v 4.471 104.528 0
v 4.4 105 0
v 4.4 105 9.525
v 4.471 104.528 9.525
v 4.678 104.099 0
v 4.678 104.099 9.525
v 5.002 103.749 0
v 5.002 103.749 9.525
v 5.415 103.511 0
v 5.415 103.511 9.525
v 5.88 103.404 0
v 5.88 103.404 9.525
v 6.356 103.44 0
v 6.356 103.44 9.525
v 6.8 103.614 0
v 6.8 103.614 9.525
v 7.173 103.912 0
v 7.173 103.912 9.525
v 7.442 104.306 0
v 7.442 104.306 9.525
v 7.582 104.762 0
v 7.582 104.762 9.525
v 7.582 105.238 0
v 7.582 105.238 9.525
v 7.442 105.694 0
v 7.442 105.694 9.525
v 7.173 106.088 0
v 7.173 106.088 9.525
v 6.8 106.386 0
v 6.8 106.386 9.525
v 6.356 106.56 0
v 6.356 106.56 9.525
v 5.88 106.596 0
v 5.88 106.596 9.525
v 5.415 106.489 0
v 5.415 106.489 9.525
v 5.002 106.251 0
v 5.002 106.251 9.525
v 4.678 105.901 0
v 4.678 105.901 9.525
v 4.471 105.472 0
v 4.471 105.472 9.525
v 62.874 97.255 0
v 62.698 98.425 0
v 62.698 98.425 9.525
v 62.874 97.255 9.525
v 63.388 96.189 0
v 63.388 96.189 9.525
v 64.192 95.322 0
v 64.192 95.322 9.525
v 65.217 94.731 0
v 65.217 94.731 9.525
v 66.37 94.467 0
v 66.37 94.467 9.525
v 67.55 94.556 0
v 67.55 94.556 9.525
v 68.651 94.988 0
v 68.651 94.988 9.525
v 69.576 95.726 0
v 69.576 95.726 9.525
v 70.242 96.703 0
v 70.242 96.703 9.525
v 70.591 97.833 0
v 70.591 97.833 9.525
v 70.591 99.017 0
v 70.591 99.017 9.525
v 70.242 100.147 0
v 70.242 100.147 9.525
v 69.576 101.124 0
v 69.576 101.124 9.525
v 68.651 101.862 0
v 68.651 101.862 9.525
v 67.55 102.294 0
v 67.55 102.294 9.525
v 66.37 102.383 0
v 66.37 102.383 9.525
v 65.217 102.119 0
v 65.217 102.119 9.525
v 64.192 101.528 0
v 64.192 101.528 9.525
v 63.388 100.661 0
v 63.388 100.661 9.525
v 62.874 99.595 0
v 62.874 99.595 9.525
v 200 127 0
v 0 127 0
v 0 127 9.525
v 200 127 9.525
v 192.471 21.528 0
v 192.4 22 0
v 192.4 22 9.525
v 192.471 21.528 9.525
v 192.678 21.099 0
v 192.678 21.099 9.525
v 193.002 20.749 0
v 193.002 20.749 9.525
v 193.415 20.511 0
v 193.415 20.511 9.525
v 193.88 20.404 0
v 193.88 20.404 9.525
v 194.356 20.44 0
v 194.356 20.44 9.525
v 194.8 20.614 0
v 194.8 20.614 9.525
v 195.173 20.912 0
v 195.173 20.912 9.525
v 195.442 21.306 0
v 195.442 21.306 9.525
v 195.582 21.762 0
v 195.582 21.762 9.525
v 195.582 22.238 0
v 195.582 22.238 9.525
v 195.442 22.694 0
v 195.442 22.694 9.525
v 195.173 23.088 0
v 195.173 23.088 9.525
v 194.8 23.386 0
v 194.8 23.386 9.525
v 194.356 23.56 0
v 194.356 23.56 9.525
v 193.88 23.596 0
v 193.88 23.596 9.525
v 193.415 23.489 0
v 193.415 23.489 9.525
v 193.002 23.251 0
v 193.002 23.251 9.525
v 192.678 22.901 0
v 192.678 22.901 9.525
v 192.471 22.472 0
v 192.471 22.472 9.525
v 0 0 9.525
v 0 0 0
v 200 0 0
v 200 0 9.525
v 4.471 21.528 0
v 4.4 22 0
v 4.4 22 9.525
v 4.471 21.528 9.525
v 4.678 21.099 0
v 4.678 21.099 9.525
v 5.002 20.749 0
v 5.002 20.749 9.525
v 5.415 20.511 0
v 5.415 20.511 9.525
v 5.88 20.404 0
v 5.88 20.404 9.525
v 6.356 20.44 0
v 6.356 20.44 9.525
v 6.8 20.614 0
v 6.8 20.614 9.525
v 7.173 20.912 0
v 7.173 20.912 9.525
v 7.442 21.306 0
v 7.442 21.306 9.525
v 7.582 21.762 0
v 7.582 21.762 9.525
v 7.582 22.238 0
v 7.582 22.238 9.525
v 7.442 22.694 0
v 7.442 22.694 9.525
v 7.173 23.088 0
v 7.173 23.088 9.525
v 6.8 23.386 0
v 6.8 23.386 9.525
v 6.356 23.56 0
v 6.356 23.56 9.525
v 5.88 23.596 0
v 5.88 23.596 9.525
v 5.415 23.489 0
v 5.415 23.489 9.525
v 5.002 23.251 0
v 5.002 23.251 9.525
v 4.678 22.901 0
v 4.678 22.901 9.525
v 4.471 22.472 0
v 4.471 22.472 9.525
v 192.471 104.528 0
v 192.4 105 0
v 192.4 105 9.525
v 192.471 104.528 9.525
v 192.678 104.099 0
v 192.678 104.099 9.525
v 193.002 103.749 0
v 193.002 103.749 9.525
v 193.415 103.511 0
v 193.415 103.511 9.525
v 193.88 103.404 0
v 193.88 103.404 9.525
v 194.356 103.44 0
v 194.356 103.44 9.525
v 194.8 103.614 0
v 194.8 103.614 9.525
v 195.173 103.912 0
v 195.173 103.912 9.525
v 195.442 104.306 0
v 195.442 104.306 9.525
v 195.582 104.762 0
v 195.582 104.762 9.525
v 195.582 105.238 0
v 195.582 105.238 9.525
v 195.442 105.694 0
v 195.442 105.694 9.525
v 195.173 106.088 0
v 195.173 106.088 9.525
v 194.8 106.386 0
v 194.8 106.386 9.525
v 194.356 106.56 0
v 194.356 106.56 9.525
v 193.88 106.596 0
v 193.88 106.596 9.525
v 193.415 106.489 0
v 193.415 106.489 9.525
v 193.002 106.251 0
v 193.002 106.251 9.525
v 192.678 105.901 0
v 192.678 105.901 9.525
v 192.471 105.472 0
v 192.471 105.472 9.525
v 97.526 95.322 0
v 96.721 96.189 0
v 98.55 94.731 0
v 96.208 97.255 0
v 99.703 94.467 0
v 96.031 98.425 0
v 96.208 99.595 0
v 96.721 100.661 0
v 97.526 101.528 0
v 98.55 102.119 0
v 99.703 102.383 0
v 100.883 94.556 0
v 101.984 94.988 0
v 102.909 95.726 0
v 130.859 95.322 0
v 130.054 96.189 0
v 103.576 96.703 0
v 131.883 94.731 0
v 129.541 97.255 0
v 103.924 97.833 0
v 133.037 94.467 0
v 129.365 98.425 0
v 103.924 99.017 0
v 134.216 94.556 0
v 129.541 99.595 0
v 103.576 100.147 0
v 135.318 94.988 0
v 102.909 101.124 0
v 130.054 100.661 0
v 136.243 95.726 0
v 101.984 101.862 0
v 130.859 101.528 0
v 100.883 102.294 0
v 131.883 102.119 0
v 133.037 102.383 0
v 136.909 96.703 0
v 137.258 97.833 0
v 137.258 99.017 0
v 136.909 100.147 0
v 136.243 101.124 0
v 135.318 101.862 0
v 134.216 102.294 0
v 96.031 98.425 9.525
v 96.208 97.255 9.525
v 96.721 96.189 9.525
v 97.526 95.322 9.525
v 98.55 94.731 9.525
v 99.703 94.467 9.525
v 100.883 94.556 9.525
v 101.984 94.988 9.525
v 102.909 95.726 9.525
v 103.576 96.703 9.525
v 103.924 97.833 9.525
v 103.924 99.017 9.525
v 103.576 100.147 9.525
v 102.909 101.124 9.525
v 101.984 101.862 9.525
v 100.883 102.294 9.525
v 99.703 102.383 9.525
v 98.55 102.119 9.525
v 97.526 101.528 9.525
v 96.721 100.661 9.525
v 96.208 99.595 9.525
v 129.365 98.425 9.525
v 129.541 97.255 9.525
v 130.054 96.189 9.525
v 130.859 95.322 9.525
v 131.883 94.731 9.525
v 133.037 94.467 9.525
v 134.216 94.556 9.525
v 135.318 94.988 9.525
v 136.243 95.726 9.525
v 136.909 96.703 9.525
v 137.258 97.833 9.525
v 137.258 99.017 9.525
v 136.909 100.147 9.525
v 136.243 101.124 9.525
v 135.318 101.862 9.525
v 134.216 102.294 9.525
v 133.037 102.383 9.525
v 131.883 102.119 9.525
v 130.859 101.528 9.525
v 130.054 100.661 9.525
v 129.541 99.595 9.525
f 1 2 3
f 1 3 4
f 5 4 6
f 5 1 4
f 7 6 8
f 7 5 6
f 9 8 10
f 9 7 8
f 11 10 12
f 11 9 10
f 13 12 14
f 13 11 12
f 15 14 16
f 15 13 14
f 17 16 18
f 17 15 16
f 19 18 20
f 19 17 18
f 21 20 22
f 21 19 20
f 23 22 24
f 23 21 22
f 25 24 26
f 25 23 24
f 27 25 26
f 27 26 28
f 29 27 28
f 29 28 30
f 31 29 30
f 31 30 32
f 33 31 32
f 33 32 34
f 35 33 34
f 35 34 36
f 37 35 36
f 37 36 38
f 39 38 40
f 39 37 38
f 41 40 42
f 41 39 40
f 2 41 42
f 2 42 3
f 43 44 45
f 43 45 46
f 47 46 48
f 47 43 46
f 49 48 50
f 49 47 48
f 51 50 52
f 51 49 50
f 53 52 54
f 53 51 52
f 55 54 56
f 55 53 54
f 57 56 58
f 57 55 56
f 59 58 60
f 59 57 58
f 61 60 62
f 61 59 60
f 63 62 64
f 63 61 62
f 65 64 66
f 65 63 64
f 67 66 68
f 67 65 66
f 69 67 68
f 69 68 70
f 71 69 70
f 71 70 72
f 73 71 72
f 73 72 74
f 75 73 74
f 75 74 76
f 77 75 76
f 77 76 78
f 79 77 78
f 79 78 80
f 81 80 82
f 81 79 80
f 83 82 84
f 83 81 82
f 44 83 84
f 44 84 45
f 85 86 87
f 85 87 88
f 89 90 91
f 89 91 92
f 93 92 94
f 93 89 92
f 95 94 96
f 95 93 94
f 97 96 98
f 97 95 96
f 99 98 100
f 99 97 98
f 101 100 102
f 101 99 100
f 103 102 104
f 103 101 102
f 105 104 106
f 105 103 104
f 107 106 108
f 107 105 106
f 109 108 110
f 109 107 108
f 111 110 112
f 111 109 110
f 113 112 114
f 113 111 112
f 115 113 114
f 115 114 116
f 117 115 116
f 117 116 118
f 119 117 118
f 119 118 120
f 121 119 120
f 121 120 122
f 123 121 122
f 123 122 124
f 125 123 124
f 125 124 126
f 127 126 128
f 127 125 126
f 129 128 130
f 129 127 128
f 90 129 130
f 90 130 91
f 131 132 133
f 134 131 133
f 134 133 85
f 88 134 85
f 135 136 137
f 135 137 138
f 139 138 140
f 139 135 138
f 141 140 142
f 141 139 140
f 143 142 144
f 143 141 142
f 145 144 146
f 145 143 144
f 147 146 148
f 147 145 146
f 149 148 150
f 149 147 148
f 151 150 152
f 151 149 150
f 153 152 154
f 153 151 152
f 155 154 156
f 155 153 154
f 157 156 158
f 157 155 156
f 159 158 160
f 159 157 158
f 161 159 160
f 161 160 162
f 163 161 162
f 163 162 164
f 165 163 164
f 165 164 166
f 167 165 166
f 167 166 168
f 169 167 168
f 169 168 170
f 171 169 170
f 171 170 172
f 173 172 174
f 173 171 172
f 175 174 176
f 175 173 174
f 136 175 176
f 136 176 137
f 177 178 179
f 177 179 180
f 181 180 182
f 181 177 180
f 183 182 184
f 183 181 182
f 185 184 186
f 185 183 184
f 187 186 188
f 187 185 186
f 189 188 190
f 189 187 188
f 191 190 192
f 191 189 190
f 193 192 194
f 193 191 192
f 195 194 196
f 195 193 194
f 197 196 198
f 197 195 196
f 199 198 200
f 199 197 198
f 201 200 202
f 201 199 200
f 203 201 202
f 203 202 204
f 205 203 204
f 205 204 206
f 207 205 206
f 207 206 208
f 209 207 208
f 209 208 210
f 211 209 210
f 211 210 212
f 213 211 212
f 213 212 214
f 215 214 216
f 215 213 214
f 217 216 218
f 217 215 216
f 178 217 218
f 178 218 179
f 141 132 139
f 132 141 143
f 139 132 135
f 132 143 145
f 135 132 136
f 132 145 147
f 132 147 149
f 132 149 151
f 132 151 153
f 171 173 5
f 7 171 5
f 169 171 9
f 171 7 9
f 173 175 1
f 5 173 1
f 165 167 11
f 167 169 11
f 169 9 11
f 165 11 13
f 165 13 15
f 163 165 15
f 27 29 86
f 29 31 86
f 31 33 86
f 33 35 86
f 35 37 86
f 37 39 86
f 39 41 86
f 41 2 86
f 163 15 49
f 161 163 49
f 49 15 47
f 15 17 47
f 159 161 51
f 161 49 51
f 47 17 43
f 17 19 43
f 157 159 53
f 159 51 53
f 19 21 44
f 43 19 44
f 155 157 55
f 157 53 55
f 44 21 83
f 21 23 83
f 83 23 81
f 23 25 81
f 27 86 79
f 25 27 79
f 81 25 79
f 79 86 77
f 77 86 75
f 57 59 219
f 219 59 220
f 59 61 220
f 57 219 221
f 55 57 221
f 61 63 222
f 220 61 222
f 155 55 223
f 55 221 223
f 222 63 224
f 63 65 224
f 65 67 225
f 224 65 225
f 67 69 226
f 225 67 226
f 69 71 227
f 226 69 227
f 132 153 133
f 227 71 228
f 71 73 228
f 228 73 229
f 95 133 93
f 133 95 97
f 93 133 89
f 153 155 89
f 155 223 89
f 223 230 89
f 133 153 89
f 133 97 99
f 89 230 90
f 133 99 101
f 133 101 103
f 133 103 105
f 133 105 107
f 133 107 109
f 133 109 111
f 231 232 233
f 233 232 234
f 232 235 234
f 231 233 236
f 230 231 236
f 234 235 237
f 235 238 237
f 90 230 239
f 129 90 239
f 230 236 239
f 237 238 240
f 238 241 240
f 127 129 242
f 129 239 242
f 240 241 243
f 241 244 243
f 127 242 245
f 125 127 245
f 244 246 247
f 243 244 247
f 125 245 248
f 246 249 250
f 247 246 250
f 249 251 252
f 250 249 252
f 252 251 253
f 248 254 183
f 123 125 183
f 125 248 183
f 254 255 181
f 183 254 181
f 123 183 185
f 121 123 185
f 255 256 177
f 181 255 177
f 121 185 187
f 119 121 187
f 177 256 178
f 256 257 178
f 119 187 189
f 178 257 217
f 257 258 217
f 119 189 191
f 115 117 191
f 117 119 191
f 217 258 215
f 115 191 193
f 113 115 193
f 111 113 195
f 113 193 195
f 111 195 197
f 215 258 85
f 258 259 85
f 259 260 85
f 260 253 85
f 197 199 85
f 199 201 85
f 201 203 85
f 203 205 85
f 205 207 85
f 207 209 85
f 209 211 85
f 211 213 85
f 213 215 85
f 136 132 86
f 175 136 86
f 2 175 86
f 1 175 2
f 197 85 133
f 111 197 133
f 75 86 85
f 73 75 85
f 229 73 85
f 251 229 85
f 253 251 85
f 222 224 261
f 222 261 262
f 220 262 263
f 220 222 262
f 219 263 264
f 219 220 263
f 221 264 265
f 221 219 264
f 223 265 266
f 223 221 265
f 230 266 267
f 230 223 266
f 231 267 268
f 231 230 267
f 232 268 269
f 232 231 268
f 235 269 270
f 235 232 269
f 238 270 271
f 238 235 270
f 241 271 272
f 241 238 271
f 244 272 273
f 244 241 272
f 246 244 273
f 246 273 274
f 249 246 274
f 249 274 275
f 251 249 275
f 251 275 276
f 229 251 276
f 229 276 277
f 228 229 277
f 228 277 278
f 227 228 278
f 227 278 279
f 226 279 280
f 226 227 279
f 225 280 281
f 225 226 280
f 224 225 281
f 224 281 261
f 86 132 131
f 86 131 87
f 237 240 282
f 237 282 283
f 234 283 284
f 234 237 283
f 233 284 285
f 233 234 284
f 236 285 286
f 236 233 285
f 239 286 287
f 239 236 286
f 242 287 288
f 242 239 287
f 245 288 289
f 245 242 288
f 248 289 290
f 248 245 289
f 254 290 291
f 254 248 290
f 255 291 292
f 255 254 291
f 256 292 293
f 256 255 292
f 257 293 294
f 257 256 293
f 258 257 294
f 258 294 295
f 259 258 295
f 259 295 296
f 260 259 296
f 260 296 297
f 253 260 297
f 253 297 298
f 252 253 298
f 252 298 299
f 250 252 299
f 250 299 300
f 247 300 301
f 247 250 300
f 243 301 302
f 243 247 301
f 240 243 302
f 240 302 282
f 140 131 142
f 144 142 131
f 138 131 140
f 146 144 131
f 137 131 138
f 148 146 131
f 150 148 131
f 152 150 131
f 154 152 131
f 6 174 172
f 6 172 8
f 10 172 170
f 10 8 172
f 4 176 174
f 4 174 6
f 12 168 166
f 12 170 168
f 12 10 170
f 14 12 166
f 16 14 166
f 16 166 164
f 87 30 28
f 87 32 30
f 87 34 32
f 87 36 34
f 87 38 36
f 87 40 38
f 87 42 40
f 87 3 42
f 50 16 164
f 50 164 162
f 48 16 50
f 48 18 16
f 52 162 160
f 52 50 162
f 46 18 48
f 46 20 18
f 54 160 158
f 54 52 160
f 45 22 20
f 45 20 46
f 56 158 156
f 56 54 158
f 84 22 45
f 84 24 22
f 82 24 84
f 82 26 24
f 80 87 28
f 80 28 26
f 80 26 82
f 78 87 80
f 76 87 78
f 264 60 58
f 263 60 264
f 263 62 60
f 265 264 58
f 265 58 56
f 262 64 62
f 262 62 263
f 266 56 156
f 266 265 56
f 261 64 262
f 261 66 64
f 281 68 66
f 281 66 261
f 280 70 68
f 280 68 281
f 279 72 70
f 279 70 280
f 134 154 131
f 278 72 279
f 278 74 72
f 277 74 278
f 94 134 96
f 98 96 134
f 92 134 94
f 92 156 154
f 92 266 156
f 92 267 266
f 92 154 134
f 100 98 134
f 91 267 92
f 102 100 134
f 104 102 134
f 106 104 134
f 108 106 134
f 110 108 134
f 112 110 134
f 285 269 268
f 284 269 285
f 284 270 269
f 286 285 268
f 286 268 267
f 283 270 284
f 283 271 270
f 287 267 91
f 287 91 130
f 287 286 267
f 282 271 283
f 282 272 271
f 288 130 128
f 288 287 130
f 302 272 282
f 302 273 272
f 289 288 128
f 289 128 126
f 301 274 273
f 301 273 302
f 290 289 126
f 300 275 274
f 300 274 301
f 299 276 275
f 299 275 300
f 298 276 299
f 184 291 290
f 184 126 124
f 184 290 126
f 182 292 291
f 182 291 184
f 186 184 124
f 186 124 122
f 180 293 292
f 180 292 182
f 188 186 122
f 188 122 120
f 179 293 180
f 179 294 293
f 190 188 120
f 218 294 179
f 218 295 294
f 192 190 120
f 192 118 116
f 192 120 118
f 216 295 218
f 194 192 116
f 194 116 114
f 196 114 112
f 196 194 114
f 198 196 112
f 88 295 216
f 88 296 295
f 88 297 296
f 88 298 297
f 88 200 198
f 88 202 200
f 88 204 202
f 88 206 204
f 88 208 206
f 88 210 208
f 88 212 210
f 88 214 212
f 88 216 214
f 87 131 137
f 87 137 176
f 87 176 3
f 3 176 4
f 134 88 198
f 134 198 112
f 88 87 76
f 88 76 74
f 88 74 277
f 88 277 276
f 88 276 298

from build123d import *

# Parameters (mm, degrees)
SKETCH1_W           = 200
SKETCH1_H           = 127
SKETCH1_R           = 3.96875
SKETCH1_R_2         = 1.6
BOSS_EXTRUDE1_DEPTH = 9.525


with BuildPart() as part:
    # Sketch1 → Boss-Extrude1 (new body)
    with BuildSketch(Plane.XY):
        with Locations((100, 63.5)):
            Rectangle(SKETCH1_W, SKETCH1_H)
        with Locations(Location((66.666666667, 98.425, 0), (0, 0, 180))):
            Circle(SKETCH1_R, mode=Mode.SUBTRACT)
        with Locations(Location((100, 98.425, 0), (0, 0, 180))):
            Circle(SKETCH1_R, mode=Mode.SUBTRACT)
        with Locations(Location((133.333333333, 98.425, 0), (0, 0, 180))):
            Circle(SKETCH1_R, mode=Mode.SUBTRACT)
        with Locations(Location((6, 105, 0), (0, 0, 180))):
            Circle(SKETCH1_R_2, mode=Mode.SUBTRACT)
        with Locations(Location((6, 22, 0), (0, 0, 180))):
            Circle(SKETCH1_R_2, mode=Mode.SUBTRACT)
        with Locations(Location((194, 22, 0), (0, 0, 180))):
            Circle(SKETCH1_R_2, mode=Mode.SUBTRACT)
        with Locations(Location((194, 105, 0), (0, 0, 180))):
            Circle(SKETCH1_R_2, mode=Mode.SUBTRACT)
    extrude(amount=BOSS_EXTRUDE1_DEPTH)


solid = part.part
